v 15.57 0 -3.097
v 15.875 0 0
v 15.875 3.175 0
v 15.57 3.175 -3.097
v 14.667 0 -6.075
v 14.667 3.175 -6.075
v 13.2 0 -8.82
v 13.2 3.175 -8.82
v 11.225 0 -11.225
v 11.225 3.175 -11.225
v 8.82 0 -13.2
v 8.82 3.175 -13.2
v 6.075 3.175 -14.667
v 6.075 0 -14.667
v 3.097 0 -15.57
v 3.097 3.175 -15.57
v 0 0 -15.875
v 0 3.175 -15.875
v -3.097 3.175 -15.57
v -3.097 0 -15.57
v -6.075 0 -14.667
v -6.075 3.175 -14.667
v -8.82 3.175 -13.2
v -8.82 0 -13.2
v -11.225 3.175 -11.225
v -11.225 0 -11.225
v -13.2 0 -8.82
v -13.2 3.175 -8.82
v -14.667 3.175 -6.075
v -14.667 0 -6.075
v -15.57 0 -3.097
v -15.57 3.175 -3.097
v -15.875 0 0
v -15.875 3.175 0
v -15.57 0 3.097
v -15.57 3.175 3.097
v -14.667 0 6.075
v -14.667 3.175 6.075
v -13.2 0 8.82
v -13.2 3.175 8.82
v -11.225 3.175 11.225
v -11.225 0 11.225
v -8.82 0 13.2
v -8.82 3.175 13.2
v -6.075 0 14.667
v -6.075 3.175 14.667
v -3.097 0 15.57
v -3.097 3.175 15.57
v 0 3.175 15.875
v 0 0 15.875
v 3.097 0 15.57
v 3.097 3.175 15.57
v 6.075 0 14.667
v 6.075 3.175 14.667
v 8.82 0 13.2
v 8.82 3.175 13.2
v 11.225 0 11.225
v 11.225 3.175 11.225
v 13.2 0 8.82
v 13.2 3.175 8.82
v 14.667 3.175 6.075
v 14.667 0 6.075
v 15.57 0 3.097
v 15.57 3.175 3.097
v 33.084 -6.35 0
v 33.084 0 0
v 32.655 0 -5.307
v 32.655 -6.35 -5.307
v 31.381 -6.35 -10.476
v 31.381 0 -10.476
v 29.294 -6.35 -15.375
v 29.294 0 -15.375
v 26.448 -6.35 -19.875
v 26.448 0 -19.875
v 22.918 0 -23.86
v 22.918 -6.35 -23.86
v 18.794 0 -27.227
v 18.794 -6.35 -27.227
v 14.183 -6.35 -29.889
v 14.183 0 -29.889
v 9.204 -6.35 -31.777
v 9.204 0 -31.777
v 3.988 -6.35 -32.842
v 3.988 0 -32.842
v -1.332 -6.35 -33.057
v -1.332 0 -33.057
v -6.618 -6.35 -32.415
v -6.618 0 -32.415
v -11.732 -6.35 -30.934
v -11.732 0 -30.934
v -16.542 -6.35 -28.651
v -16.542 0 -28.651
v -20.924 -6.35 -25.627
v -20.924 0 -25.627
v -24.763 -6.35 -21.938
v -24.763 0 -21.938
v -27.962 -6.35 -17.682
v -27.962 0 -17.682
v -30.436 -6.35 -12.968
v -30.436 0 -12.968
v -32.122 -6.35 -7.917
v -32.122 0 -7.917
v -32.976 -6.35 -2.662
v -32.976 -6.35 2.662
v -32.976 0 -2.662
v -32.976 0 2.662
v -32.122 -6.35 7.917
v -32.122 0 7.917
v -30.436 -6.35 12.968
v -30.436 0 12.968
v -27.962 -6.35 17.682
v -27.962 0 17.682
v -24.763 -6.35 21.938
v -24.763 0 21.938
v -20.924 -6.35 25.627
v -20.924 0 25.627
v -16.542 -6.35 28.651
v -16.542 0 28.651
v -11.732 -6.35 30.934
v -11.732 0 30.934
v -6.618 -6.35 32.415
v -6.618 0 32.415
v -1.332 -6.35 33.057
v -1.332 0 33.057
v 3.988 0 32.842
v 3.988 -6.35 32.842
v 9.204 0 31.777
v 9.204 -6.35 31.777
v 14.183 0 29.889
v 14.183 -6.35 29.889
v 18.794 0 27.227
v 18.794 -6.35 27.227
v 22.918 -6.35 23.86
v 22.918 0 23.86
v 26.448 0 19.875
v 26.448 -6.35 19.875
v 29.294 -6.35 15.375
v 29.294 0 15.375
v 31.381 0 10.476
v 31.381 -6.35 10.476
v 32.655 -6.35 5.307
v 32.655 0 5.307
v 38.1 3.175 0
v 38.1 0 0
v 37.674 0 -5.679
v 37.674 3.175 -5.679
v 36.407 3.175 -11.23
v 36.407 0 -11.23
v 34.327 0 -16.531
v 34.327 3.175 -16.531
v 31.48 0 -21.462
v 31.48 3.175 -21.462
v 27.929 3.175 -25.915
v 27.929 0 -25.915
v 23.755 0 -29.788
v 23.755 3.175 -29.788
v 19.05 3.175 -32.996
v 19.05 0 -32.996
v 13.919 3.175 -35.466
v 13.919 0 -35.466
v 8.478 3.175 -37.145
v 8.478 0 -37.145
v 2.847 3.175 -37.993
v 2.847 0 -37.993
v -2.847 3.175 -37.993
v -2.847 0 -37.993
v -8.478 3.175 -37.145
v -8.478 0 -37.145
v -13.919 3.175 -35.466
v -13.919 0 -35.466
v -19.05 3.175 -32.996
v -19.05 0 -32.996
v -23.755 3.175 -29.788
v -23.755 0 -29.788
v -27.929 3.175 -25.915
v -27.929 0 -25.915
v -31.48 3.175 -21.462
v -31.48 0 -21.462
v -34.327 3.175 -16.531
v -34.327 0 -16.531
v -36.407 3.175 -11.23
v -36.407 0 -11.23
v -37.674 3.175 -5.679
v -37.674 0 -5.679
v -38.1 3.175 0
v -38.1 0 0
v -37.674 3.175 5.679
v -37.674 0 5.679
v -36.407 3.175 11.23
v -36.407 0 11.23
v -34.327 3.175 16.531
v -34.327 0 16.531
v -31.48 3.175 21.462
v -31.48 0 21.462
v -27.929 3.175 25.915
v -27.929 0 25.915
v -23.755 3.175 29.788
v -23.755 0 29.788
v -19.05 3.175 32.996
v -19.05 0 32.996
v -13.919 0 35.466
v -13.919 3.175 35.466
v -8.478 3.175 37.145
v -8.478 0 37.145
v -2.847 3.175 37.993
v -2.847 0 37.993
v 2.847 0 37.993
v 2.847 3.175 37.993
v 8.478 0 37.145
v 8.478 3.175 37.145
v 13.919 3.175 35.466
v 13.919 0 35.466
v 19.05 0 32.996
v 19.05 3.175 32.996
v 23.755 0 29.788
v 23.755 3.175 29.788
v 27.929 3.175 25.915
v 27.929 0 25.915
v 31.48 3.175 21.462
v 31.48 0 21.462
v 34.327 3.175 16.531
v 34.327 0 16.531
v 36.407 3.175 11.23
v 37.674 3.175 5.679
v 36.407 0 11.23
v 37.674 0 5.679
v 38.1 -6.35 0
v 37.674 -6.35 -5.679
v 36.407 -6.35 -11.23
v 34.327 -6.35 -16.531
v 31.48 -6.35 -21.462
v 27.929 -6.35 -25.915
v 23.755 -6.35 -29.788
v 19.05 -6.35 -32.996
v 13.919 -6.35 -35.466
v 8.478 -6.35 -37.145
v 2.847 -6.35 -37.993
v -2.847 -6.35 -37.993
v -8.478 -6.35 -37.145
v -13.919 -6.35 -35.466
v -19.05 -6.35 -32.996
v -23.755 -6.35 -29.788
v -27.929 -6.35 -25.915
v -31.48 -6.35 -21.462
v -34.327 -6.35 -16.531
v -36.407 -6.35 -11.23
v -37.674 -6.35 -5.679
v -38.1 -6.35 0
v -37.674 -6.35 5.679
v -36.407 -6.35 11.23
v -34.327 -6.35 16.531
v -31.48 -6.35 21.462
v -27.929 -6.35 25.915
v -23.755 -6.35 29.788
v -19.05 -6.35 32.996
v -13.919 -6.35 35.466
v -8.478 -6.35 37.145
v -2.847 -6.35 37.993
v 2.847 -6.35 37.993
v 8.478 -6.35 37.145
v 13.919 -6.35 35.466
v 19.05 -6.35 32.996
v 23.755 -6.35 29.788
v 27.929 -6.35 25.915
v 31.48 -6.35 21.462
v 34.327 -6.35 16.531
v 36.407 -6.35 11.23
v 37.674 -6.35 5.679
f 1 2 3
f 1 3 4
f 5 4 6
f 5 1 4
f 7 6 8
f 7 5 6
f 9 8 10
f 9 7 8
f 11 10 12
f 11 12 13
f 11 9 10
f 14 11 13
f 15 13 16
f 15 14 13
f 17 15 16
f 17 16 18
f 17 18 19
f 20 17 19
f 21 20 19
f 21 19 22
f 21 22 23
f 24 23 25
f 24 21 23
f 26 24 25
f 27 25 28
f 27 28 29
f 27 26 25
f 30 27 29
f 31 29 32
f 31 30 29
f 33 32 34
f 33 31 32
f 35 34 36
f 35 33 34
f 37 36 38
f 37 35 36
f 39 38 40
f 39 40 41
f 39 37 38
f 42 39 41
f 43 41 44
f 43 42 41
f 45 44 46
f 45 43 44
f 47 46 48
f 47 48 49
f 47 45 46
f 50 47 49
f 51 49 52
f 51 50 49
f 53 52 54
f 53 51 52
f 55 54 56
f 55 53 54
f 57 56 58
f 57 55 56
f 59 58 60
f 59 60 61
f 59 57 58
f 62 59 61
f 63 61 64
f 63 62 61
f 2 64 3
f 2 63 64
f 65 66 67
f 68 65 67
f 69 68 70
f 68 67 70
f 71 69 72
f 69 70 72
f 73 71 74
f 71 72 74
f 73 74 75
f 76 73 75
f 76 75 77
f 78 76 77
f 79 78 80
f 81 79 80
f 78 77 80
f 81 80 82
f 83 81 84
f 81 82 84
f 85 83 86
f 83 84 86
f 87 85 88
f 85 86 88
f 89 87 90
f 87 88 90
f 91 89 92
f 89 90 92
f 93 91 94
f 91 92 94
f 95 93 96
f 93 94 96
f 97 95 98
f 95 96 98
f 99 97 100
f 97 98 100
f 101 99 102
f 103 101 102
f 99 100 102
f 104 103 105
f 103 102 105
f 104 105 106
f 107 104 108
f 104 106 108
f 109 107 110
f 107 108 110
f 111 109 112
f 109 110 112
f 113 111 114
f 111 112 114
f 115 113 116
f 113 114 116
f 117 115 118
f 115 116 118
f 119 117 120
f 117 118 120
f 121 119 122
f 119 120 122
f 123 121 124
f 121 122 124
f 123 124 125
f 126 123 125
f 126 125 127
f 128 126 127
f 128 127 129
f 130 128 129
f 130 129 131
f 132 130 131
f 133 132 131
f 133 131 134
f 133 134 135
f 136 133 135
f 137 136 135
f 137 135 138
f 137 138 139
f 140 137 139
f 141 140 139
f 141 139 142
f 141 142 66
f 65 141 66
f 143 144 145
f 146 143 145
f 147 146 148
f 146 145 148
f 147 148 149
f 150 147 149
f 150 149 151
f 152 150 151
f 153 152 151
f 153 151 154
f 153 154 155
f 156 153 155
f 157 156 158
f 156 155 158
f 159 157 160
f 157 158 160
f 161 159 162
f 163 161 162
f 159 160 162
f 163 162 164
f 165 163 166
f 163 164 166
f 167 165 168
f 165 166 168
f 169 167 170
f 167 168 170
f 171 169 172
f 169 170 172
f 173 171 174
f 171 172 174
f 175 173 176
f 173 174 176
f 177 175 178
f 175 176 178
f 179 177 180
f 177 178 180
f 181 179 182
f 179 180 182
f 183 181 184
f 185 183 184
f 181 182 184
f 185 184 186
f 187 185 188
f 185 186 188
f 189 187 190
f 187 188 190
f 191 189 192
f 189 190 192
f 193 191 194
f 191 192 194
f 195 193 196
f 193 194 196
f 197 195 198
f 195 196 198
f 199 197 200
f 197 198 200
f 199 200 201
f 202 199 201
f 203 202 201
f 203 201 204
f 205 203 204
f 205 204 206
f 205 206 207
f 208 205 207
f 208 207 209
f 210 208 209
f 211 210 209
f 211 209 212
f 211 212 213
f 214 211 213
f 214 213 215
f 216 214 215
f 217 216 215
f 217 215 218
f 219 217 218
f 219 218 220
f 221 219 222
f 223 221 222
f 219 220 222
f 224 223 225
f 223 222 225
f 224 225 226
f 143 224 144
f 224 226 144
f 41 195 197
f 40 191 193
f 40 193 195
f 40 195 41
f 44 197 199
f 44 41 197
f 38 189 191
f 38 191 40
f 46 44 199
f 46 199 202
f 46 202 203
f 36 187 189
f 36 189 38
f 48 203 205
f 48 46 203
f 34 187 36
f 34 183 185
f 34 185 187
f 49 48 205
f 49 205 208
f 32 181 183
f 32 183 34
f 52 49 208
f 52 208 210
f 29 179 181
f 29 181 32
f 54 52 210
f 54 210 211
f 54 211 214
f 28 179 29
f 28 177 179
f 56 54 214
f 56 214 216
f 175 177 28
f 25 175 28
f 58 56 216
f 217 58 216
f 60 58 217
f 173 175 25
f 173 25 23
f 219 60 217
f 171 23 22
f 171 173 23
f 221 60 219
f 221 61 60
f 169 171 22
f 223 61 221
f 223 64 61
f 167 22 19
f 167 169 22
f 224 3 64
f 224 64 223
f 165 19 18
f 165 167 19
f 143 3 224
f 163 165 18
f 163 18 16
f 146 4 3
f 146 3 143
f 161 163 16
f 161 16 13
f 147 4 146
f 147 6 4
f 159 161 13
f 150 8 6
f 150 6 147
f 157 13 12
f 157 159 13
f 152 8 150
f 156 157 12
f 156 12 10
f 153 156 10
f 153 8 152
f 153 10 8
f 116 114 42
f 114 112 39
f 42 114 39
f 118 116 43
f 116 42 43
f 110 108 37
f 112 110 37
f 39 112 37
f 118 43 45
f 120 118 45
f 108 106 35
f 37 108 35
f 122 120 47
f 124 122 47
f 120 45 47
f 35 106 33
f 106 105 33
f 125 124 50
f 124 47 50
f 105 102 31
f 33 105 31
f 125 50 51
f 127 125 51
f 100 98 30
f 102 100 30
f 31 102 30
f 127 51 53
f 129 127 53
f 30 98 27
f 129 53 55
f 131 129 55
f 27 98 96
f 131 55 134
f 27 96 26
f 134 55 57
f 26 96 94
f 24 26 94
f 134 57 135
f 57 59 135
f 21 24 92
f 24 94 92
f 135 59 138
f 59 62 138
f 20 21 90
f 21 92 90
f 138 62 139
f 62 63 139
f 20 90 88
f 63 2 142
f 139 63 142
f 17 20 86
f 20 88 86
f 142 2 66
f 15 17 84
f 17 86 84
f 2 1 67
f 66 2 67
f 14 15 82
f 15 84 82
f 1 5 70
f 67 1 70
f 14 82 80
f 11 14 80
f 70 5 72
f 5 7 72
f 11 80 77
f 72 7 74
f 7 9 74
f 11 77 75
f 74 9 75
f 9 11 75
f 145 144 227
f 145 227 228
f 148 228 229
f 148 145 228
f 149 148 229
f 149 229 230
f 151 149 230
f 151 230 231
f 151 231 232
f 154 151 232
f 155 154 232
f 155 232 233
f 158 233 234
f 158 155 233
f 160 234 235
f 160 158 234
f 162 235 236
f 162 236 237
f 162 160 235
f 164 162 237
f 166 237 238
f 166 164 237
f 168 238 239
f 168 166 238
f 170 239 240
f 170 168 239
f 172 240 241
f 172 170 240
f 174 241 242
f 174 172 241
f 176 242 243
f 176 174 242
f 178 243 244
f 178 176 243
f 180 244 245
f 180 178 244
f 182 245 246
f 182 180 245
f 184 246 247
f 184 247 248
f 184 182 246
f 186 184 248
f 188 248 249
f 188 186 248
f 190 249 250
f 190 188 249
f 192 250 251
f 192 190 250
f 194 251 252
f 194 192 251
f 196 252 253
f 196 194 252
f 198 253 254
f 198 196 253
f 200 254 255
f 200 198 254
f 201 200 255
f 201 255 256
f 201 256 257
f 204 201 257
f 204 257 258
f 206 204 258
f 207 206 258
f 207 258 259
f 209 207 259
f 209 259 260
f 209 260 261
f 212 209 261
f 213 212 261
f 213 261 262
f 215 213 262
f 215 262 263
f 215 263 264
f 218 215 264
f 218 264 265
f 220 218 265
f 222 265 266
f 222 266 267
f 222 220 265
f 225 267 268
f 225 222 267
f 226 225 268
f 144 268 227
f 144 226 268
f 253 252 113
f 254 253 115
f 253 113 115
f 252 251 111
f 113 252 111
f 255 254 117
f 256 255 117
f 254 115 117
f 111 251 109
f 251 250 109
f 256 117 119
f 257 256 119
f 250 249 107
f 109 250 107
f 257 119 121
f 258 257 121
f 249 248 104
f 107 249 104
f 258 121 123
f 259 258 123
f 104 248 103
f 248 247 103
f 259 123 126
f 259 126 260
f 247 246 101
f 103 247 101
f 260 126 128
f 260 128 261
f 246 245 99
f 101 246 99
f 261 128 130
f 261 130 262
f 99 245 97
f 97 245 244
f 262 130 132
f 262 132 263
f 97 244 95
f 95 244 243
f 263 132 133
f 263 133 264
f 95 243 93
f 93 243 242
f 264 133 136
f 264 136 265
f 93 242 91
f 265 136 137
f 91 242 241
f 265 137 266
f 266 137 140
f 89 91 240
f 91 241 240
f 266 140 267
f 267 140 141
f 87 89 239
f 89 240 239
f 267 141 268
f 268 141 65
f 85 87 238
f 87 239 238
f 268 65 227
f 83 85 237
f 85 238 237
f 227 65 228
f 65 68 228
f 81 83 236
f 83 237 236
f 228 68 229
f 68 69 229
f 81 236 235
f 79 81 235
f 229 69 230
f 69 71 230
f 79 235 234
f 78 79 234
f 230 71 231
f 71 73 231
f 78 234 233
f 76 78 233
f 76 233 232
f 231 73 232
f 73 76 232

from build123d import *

# Parameters (mm, degrees)
SKETCH1_R           = 38.1
SKETCH1_R_2         = 33.0835
BOSS_EXTRUDE1_DEPTH = 6.35
SKETCH2_R           = 38.1
SKETCH2_R_2         = 15.875
BOSS_EXTRUDE2_DEPTH = 3.175


with BuildPart() as part:
    # Sketch1 → Boss-Extrude1 (new body)
    with BuildSketch(Plane(origin=(0, 0, 0), x_dir=(1, 0, 0), z_dir=(0, 1, 0))):
        Circle(SKETCH1_R)
        Circle(SKETCH1_R_2, mode=Mode.SUBTRACT)
    extrude(amount=-BOSS_EXTRUDE1_DEPTH)

    # Sketch2 → Boss-Extrude2 (add)
    with BuildSketch(Plane(origin=(0, 0, 0), x_dir=(1, 0, 0), z_dir=(0, 1, 0))):
        Circle(SKETCH2_R)
        Circle(SKETCH2_R_2, mode=Mode.SUBTRACT)
    extrude(amount=BOSS_EXTRUDE2_DEPTH)


solid = part.part
